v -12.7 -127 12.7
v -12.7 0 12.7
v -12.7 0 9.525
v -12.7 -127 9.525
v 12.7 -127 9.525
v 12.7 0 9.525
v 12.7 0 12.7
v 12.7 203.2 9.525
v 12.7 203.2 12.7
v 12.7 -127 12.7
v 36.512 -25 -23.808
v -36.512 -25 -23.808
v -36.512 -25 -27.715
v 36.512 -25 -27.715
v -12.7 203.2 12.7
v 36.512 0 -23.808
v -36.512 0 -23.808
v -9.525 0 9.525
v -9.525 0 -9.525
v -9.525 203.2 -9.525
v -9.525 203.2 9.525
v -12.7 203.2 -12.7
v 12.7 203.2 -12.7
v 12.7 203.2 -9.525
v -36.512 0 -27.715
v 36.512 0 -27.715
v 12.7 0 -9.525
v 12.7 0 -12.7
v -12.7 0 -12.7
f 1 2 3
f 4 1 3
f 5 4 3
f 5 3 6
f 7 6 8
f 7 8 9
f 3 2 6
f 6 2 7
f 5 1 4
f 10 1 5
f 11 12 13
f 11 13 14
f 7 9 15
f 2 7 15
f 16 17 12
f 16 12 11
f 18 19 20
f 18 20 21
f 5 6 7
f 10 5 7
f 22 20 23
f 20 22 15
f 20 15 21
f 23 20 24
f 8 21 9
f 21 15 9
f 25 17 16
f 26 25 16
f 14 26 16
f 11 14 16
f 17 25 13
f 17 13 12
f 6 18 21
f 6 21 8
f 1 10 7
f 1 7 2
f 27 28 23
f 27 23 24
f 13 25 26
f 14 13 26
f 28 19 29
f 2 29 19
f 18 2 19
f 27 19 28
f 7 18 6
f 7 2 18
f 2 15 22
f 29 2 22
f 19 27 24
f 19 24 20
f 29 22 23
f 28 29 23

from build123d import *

# Parameters (mm, degrees)
F0_W     = 3.175
F0_H     = 19.05
F1_DEPTH = 203.2
F2_DEPTH = 127
F3_W     = 73.025
F3_H     = 3.906977
F4_DEPTH = 25


with BuildPart() as f1:
    # F0 (on Front) → F1 (new body)
    with BuildSketch(Plane.XZ):
        Polygon((12.7, 12.7), (-12.7, 12.7), (-12.7, 9.525), (-9.525, 9.525), (12.7, 9.525), align=None)
        with Locations((-11.1125, 0)):
            Rectangle(F0_W, F0_H)
        Polygon((-9.525, -9.525), (-12.7, -9.525), (-12.7, -12.7), (12.7, -12.7), (12.7, -9.525), align=None)
    extrude(amount=-F1_DEPTH)


with BuildPart() as f2:
    # F0 (on Front) → F2 (new body)
    with BuildSketch(Plane.XZ):
        Polygon((12.7, 12.7), (-12.7, 12.7), (-12.7, 9.525), (-9.525, 9.525), (12.7, 9.525), align=None)
    extrude(amount=F2_DEPTH)


with BuildPart() as f4:
    # F3 (on Front) → F4 (new body)
    with BuildSketch(Plane.XZ):
        with Locations((0, -25.761629)):
            Rectangle(F3_W, F3_H)
    extrude(amount=F4_DEPTH)


solid = Compound([f1.part, f2.part, f4.part])
